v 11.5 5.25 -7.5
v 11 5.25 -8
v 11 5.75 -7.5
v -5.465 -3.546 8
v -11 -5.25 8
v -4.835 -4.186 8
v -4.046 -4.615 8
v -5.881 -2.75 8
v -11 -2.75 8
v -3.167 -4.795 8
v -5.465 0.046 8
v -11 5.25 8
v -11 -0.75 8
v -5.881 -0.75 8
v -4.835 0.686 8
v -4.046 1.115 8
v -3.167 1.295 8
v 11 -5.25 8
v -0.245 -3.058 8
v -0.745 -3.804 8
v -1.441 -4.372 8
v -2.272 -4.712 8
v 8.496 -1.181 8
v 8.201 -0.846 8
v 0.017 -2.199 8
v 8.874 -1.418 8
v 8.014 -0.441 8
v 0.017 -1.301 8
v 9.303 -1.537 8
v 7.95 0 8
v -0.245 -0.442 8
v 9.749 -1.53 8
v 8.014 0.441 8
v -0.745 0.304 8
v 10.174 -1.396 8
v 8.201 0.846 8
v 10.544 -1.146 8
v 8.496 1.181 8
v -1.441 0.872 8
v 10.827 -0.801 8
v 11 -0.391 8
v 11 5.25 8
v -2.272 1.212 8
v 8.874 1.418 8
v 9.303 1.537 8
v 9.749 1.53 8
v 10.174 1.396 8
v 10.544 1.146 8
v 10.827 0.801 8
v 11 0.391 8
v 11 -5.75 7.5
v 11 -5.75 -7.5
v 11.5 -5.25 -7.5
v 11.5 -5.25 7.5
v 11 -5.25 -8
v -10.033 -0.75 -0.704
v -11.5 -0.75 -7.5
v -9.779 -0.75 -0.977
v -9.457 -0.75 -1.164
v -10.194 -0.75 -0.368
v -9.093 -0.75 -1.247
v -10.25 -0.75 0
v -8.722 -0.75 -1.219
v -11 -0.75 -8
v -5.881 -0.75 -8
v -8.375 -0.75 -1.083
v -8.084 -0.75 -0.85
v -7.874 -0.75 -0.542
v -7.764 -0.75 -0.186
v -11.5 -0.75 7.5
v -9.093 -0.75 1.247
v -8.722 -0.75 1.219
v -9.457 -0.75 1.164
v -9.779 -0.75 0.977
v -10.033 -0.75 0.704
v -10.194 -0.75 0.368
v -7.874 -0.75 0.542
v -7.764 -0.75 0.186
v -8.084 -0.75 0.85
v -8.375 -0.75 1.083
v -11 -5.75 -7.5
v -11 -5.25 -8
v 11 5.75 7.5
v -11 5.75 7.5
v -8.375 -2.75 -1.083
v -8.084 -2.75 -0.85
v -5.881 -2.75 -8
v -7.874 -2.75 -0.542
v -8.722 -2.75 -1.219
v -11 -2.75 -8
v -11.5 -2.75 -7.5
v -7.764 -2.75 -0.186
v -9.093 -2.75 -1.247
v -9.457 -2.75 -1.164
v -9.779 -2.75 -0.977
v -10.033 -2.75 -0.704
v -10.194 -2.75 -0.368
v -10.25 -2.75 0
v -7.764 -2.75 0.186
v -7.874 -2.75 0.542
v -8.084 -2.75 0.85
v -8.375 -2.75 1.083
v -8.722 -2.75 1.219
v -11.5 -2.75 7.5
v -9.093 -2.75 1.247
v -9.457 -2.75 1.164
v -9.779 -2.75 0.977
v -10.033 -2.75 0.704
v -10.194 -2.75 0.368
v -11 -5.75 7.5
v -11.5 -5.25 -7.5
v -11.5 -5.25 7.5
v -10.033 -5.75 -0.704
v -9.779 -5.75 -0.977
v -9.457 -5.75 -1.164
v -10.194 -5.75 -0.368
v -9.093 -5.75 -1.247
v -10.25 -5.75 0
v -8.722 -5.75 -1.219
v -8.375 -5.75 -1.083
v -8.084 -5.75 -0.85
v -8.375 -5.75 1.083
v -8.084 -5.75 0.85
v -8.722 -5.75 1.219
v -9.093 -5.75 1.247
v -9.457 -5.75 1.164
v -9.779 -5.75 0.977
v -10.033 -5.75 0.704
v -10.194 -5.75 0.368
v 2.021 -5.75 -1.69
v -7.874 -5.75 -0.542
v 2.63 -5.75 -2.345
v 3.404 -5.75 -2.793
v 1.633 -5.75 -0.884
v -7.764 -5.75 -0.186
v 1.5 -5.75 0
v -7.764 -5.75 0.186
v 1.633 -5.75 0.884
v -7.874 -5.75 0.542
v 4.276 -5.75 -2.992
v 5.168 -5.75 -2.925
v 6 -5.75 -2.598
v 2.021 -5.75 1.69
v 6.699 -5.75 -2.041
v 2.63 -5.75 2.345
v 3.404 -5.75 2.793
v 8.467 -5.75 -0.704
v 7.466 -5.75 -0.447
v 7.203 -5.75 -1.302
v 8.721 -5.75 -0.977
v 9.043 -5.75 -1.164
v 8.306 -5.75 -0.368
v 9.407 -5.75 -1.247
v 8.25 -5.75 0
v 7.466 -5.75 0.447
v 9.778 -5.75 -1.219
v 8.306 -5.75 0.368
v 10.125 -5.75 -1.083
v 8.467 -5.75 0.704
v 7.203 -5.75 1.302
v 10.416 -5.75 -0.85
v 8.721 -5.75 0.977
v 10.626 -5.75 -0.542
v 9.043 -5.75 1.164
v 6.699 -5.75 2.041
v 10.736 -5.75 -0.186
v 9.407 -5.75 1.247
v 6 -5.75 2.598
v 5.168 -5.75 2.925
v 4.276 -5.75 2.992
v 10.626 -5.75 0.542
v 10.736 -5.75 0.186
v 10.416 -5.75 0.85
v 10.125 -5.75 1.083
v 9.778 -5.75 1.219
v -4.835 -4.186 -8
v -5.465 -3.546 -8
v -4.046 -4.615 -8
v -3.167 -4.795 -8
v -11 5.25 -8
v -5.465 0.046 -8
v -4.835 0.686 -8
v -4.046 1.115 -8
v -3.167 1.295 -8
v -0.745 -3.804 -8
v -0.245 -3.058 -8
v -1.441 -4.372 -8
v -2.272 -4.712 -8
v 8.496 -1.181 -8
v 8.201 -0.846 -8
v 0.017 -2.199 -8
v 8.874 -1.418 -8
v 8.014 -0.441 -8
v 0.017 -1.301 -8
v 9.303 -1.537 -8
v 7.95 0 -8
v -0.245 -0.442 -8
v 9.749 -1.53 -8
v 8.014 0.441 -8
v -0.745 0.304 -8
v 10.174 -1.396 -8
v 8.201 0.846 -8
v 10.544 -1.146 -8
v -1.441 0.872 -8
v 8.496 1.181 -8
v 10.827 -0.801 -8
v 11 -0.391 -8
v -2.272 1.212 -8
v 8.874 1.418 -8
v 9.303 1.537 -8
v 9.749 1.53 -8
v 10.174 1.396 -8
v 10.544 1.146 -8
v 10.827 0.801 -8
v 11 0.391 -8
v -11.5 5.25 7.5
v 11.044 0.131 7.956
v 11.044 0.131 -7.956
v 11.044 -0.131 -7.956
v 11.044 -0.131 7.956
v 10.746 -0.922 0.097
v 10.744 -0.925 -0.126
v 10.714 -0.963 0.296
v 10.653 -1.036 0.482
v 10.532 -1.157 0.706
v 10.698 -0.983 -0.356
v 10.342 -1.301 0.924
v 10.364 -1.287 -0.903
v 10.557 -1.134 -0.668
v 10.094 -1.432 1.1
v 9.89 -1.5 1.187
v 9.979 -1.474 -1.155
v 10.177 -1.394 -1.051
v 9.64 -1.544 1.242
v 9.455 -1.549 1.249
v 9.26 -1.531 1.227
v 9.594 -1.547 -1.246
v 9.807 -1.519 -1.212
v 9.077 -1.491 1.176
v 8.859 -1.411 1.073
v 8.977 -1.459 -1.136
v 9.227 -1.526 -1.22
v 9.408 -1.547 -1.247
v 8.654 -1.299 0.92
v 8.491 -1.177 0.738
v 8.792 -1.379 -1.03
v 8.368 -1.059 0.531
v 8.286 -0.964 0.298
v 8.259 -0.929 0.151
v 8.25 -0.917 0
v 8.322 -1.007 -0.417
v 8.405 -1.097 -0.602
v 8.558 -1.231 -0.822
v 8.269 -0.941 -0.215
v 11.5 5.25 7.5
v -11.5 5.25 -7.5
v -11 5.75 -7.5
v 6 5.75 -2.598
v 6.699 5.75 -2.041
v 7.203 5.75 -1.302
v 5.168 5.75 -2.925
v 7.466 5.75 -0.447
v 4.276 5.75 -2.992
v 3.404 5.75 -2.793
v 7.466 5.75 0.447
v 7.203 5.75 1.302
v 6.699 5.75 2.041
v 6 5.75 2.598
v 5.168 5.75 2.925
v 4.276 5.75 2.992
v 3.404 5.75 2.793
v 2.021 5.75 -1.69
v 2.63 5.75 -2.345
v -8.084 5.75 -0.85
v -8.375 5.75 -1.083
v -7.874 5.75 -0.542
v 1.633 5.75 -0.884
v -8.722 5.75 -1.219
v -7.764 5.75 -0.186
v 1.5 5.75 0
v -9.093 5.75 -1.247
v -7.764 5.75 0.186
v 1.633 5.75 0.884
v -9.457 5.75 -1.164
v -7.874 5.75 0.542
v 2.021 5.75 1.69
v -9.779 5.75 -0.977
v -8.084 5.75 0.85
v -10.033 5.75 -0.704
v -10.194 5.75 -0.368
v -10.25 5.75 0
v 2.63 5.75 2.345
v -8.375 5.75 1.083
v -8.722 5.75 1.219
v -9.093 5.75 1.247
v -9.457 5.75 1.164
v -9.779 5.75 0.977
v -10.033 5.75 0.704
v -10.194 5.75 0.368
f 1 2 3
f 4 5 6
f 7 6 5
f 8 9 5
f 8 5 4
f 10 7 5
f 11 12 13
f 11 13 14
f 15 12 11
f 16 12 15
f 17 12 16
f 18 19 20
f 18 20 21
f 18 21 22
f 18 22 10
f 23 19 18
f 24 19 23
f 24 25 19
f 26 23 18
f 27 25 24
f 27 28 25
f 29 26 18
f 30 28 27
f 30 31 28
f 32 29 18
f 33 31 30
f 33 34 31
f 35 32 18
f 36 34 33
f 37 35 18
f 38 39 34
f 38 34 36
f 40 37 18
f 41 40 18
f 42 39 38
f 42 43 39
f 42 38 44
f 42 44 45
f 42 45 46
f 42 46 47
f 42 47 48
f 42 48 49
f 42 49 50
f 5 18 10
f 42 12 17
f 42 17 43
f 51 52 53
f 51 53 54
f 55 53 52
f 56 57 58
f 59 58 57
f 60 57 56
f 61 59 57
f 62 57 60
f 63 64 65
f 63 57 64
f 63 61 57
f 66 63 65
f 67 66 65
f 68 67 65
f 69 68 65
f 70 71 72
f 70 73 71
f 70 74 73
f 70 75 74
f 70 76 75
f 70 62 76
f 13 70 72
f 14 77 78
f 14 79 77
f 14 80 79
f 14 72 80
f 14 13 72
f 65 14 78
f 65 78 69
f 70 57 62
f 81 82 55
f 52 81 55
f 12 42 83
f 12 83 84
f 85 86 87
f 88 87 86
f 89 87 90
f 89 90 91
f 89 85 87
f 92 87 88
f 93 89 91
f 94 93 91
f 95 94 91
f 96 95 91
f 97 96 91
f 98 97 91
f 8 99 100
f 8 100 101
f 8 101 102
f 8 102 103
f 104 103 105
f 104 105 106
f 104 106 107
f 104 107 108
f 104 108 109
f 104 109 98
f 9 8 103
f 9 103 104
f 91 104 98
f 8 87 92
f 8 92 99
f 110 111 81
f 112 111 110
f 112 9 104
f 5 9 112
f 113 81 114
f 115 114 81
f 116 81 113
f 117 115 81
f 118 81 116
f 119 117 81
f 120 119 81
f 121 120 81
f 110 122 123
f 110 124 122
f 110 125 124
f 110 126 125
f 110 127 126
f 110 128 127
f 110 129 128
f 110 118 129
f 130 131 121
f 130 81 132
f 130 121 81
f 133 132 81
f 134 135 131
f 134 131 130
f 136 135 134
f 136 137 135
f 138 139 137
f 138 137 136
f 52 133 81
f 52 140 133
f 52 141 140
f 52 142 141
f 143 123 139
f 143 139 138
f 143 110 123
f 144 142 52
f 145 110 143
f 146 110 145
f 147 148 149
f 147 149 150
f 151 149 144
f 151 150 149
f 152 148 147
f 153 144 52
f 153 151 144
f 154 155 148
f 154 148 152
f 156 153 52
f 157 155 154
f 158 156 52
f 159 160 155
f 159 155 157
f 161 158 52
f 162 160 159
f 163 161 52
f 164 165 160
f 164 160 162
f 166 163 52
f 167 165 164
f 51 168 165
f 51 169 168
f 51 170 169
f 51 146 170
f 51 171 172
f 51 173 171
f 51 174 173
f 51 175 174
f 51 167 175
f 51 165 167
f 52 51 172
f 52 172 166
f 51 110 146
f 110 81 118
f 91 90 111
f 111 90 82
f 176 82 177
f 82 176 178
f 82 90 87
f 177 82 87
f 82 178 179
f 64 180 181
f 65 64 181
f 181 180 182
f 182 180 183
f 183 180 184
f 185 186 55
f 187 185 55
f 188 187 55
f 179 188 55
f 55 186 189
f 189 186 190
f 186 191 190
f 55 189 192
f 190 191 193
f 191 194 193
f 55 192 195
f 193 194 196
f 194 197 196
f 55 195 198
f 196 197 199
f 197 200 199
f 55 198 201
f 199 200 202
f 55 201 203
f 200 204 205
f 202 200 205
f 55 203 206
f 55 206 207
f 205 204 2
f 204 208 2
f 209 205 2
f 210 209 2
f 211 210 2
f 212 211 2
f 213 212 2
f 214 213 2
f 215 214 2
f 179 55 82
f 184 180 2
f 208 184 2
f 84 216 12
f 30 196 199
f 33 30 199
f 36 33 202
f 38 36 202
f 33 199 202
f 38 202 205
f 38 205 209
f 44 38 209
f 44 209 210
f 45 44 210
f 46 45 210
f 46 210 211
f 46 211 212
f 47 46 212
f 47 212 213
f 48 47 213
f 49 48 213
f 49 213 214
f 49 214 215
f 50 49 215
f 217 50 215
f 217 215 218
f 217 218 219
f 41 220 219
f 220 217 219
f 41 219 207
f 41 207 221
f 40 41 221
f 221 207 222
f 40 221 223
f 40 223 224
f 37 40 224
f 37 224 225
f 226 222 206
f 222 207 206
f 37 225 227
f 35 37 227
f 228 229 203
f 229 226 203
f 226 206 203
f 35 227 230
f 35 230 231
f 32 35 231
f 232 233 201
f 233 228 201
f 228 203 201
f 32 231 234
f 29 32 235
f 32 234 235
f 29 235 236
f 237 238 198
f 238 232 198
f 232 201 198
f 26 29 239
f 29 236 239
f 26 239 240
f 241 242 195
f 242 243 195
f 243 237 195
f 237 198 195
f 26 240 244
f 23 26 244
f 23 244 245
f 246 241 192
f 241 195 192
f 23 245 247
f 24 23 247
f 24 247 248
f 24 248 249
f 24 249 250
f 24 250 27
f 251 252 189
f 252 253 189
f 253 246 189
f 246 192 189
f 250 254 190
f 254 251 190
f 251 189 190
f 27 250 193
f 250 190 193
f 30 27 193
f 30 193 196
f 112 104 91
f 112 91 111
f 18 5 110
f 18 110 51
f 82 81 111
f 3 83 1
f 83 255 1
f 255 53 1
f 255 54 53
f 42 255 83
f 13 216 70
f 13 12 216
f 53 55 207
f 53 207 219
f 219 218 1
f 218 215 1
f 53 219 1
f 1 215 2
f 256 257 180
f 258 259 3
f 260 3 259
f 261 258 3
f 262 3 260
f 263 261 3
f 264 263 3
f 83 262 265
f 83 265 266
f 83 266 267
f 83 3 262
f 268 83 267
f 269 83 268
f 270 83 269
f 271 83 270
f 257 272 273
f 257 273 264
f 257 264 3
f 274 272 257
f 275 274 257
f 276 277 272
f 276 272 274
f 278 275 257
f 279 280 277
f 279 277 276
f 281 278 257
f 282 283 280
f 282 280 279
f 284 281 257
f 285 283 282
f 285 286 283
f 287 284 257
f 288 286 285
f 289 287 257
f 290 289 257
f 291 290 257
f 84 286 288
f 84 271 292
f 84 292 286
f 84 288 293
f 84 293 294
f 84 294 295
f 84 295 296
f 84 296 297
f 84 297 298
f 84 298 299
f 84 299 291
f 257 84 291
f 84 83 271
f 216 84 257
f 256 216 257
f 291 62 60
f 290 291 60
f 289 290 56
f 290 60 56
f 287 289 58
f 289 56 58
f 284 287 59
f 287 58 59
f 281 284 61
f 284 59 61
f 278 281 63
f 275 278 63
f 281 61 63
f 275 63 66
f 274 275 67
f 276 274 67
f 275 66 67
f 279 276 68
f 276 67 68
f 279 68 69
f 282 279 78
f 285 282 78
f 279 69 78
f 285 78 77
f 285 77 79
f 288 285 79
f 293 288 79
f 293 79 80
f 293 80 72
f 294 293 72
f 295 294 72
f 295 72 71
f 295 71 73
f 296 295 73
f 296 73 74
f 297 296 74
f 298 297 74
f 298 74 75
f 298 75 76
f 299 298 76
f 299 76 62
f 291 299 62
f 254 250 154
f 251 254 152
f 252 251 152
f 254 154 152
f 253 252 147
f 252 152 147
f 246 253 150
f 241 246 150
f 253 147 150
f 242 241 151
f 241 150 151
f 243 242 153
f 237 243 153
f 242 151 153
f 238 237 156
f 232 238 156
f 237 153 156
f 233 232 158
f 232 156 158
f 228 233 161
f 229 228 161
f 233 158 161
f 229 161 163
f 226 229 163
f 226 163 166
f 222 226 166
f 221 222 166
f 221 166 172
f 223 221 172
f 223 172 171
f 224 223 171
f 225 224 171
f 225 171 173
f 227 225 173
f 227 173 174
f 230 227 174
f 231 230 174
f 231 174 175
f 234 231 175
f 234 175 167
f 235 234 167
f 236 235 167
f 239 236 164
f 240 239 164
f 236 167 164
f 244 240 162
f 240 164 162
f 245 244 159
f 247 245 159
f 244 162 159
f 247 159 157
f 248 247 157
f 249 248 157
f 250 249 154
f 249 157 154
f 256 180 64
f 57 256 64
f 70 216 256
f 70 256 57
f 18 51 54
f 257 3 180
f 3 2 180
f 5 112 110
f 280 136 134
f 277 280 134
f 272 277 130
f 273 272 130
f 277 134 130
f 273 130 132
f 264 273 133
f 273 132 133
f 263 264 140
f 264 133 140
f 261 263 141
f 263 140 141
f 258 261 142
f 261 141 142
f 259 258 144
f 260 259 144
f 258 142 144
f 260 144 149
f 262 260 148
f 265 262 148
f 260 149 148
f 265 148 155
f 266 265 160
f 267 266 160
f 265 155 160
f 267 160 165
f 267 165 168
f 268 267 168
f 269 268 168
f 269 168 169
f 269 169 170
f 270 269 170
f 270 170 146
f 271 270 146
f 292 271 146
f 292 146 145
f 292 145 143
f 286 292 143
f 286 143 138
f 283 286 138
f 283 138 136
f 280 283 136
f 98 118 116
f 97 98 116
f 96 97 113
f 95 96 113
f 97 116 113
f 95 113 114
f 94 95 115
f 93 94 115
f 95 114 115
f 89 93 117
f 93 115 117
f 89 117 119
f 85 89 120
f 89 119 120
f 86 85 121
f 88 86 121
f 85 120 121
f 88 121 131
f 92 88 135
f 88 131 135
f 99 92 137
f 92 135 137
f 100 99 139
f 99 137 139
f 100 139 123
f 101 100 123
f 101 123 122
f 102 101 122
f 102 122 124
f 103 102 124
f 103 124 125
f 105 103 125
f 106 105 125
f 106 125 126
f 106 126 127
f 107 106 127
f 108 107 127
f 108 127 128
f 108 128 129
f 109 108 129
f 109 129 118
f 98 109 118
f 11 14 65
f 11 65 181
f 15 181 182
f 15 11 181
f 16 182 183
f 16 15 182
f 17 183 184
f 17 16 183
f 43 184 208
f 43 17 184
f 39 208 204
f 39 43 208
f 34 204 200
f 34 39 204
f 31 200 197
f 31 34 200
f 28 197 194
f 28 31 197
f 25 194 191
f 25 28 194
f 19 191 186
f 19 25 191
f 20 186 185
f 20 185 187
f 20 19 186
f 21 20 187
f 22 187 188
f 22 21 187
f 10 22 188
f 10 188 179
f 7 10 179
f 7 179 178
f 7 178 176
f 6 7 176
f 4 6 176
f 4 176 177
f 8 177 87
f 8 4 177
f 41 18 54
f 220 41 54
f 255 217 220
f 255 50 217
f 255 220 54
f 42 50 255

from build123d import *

# Parameters (mm, degrees)
BOSS_EXTRUDE1_DEPTH        = 8
CHAMFER1_SIZE              = 0.5
M3X0_5_TAPPED_HOLE2_D      = 2.5
M6X1_0_TAPPED_HOLE1_D      = 6
F_3_1_3_1_DIAMETER_HOLE1_D = 3.1
M3X0_5_TAPPED_HOLE3_REACH  = 20.125
M3X0_5_TAPPED_HOLE3_BORE_R = 1.25


with BuildPart() as part:
    # Sketch1 → Boss-Extrude1 (new, symmetric)
    with BuildSketch(Plane.XY):
        with BuildLine():
            Line((-11.5, -0.75), (-5.881405907, -0.75))
            ThreePointArc((-5.881405907, -0.75), (0.05, -1.75), (-5.881405907, -2.75))
            Line((-5.881405907, -2.75), (-11.5, -2.75))
            Line((-11.5, -2.75), (-11.5, -5.75))
            Line((-11.5, -5.75), (11.5, -5.75))
            Line((11.5, -5.75), (11.5, 5.75))
            Line((11.5, 5.75), (-11.5, 5.75))
            Line((-11.5, 5.75), (-11.5, -0.75))
        make_face()
    extrude(amount=BOSS_EXTRUDE1_DEPTH, both=True)

    # Chamfer1
    chamfer1_edges = [part.edges().sort_by_distance(p)[0] for p in [
        (-11.5, 2.5, 8),
        (0, 5.75, -8),
        (11.5, 0, -8),
        (11.5, -5.75, 0),
        (-11.5, -5.75, 0),
        (-11.5, 5.75, 0),
        (11.5, 5.75, 0),
        (-11.5, -4.25, 8),
        (0, -5.75, 8),
        (11.5, 0, 8),
        (0, 5.75, 8),
        (0, -5.75, -8),
        (-11.5, -4.25, -8),
        (-11.5, 2.5, -8),
    ]]
    chamfer(chamfer1_edges, length=CHAMFER1_SIZE)

    # M3x0.5 Tapped Hole2 (through all)
    with Locations(Plane(origin=(0, 5.75, 0), x_dir=(1, 0, 0), z_dir=(0, 1, 0))):
        with Locations((-9, 0)):
            Hole(M3X0_5_TAPPED_HOLE2_D / 2)

    # M6x1.0 Tapped Hole1 (through all)
    with Locations(Plane(origin=(0, 5.75, 0), x_dir=(1, 0, 0), z_dir=(0, 1, 0))):
        with Locations((4.5, 0)):
            Hole(M6X1_0_TAPPED_HOLE1_D / 2)

    # Ø3.1 (3.1) Diameter Hole1 (through all)
    with Locations(Plane.XY.offset(8)):
        with Locations((9.5, 0)):
            Hole(F_3_1_3_1_DIAMETER_HOLE1_D / 2)

    # M3x0.5 Tapped Hole3 bore → M3x0.5 Tapped Hole3 (cut, up to next)
    with BuildSketch(Plane(origin=(0, -5.75, 0), x_dir=(-1, 0, 0), z_dir=(0, -1, 0)), mode=Mode.PRIVATE) as m3x0_5_tapped_hole3_sk1:
        with Locations((-9.5, 0)):
            Circle(M3X0_5_TAPPED_HOLE3_BORE_R)
    m3x0_5_tapped_hole3_tool1 = extrude(m3x0_5_tapped_hole3_sk1.sketch, amount=-M3X0_5_TAPPED_HOLE3_REACH, mode=Mode.PRIVATE) & part.part
    add(m3x0_5_tapped_hole3_tool1.solids().sort_by_distance((9.5, -5.75, 0))[0], mode=Mode.SUBTRACT)


solid = part.part
